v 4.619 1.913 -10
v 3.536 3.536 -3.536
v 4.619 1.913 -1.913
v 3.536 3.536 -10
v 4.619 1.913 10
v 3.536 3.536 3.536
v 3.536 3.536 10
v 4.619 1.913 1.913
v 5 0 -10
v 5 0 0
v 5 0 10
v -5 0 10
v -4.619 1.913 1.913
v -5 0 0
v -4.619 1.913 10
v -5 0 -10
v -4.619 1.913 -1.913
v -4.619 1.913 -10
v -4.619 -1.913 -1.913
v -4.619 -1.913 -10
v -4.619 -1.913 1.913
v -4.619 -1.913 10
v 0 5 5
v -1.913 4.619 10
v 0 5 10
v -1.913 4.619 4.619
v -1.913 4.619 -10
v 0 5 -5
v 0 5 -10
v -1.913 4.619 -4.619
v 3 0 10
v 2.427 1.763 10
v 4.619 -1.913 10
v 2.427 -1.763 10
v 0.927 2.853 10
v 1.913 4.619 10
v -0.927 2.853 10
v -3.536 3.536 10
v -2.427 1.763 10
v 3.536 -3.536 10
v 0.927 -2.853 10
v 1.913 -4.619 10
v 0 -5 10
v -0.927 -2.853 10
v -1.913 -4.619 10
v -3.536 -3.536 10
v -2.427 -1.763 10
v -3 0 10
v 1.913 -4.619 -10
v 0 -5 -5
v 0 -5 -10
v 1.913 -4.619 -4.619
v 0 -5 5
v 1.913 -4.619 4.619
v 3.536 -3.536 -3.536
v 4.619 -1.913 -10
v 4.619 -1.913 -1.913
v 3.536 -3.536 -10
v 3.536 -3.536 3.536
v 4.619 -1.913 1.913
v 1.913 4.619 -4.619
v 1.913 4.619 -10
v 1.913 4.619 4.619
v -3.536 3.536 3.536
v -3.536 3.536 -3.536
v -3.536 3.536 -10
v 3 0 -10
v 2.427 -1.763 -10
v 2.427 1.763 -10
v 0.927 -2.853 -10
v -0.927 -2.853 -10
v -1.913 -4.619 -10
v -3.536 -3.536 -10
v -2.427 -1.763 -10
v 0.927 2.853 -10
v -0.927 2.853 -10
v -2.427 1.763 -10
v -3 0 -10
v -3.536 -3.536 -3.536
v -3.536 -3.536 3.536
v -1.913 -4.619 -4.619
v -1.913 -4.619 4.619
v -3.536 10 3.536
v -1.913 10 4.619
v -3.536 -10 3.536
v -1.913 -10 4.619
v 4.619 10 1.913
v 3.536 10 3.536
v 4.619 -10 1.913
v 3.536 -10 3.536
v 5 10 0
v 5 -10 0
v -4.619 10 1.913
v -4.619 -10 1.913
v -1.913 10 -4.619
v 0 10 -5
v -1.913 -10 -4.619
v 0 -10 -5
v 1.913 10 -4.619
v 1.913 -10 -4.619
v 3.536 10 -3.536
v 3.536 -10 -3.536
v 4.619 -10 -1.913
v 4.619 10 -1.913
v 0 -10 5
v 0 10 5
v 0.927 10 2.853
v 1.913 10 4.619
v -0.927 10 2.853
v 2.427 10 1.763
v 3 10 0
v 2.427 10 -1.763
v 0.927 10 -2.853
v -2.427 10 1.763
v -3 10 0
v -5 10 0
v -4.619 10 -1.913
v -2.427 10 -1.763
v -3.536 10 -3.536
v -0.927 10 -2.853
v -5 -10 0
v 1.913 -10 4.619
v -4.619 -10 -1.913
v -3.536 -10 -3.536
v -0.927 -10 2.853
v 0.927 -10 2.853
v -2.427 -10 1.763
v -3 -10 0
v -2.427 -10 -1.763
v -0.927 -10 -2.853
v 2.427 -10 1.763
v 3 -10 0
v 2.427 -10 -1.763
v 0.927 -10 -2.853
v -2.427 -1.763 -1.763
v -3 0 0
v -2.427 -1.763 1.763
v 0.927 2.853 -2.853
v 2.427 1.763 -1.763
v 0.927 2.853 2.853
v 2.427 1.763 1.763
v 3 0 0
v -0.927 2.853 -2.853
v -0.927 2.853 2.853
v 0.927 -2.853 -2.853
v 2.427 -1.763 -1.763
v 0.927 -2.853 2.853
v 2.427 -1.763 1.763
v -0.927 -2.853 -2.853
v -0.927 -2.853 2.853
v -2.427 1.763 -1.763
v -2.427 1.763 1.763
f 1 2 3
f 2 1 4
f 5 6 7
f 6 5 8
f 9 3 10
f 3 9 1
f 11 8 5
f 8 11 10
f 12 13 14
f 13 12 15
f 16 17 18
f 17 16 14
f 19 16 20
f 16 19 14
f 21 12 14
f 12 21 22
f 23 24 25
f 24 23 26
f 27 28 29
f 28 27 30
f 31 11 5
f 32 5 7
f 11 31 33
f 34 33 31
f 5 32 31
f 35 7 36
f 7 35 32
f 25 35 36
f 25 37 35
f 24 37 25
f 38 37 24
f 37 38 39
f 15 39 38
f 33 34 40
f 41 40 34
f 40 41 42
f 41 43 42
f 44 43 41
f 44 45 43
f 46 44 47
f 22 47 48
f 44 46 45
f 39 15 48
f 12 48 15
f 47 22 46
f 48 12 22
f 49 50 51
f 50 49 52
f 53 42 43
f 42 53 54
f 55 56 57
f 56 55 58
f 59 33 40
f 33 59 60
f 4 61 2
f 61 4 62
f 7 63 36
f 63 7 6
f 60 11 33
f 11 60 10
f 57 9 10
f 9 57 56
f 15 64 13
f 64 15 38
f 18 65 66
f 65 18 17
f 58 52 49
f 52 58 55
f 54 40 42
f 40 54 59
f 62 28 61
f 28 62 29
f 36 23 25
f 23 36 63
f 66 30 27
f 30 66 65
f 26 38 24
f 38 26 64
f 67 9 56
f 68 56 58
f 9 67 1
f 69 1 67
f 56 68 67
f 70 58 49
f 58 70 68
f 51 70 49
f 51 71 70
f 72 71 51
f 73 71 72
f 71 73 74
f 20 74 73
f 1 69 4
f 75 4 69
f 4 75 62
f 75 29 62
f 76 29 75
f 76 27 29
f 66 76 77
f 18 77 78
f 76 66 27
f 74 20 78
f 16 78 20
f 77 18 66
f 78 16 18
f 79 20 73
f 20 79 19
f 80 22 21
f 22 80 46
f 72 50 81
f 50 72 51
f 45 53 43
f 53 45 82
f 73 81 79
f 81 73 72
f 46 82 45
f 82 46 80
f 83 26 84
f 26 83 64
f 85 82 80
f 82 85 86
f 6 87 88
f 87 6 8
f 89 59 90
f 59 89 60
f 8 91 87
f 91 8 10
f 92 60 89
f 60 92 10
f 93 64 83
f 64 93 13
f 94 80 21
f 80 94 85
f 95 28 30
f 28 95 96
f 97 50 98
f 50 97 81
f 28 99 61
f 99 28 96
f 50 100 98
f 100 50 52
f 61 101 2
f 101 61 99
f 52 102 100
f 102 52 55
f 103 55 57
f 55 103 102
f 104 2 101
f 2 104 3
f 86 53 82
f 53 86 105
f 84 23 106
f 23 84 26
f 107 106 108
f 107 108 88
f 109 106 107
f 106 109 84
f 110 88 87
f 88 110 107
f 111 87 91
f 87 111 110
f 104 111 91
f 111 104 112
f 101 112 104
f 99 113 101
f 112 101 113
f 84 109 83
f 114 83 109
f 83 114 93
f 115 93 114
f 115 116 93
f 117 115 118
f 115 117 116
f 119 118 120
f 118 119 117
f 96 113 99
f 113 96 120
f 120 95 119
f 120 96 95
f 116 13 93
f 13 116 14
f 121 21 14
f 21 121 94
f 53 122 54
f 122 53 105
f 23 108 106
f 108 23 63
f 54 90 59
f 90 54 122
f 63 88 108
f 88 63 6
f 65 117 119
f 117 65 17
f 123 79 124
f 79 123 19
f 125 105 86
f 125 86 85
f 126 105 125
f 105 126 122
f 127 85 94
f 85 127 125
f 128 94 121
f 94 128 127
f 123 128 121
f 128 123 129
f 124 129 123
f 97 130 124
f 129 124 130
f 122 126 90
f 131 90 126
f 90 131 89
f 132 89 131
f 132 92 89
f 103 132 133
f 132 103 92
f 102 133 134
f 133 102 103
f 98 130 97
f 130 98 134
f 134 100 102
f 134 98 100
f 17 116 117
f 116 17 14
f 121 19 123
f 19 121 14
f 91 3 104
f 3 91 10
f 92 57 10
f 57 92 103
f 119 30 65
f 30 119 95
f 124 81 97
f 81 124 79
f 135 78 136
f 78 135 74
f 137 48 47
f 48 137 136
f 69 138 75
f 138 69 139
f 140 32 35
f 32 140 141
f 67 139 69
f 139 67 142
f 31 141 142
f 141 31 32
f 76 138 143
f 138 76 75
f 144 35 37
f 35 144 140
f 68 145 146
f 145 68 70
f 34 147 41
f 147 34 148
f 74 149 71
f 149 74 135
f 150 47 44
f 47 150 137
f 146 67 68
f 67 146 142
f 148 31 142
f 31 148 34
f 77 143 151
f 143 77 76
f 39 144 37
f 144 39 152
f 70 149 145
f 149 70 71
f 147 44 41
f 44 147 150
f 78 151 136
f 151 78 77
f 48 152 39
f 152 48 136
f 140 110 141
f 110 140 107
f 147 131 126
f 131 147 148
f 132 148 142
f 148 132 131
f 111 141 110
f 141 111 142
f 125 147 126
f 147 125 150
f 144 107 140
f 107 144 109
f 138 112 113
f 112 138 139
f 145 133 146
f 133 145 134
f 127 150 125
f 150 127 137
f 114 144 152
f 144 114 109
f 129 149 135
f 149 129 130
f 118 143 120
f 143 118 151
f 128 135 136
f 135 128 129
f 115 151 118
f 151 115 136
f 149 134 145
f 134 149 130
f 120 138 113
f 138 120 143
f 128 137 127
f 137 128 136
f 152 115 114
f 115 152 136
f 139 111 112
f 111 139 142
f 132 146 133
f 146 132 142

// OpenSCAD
difference() {

    union() {
        cylinder(r = 5, h = 20, center = true);
        rotate([90, 0, 0]) cylinder(r = 5, h = 20, center = true);
    }

    color("green") {
        cylinder(r = 3, h = 30, center = true);
        rotate([90, 0, 0]) cylinder(r = 3, h = 30, center = true);
    }

};
